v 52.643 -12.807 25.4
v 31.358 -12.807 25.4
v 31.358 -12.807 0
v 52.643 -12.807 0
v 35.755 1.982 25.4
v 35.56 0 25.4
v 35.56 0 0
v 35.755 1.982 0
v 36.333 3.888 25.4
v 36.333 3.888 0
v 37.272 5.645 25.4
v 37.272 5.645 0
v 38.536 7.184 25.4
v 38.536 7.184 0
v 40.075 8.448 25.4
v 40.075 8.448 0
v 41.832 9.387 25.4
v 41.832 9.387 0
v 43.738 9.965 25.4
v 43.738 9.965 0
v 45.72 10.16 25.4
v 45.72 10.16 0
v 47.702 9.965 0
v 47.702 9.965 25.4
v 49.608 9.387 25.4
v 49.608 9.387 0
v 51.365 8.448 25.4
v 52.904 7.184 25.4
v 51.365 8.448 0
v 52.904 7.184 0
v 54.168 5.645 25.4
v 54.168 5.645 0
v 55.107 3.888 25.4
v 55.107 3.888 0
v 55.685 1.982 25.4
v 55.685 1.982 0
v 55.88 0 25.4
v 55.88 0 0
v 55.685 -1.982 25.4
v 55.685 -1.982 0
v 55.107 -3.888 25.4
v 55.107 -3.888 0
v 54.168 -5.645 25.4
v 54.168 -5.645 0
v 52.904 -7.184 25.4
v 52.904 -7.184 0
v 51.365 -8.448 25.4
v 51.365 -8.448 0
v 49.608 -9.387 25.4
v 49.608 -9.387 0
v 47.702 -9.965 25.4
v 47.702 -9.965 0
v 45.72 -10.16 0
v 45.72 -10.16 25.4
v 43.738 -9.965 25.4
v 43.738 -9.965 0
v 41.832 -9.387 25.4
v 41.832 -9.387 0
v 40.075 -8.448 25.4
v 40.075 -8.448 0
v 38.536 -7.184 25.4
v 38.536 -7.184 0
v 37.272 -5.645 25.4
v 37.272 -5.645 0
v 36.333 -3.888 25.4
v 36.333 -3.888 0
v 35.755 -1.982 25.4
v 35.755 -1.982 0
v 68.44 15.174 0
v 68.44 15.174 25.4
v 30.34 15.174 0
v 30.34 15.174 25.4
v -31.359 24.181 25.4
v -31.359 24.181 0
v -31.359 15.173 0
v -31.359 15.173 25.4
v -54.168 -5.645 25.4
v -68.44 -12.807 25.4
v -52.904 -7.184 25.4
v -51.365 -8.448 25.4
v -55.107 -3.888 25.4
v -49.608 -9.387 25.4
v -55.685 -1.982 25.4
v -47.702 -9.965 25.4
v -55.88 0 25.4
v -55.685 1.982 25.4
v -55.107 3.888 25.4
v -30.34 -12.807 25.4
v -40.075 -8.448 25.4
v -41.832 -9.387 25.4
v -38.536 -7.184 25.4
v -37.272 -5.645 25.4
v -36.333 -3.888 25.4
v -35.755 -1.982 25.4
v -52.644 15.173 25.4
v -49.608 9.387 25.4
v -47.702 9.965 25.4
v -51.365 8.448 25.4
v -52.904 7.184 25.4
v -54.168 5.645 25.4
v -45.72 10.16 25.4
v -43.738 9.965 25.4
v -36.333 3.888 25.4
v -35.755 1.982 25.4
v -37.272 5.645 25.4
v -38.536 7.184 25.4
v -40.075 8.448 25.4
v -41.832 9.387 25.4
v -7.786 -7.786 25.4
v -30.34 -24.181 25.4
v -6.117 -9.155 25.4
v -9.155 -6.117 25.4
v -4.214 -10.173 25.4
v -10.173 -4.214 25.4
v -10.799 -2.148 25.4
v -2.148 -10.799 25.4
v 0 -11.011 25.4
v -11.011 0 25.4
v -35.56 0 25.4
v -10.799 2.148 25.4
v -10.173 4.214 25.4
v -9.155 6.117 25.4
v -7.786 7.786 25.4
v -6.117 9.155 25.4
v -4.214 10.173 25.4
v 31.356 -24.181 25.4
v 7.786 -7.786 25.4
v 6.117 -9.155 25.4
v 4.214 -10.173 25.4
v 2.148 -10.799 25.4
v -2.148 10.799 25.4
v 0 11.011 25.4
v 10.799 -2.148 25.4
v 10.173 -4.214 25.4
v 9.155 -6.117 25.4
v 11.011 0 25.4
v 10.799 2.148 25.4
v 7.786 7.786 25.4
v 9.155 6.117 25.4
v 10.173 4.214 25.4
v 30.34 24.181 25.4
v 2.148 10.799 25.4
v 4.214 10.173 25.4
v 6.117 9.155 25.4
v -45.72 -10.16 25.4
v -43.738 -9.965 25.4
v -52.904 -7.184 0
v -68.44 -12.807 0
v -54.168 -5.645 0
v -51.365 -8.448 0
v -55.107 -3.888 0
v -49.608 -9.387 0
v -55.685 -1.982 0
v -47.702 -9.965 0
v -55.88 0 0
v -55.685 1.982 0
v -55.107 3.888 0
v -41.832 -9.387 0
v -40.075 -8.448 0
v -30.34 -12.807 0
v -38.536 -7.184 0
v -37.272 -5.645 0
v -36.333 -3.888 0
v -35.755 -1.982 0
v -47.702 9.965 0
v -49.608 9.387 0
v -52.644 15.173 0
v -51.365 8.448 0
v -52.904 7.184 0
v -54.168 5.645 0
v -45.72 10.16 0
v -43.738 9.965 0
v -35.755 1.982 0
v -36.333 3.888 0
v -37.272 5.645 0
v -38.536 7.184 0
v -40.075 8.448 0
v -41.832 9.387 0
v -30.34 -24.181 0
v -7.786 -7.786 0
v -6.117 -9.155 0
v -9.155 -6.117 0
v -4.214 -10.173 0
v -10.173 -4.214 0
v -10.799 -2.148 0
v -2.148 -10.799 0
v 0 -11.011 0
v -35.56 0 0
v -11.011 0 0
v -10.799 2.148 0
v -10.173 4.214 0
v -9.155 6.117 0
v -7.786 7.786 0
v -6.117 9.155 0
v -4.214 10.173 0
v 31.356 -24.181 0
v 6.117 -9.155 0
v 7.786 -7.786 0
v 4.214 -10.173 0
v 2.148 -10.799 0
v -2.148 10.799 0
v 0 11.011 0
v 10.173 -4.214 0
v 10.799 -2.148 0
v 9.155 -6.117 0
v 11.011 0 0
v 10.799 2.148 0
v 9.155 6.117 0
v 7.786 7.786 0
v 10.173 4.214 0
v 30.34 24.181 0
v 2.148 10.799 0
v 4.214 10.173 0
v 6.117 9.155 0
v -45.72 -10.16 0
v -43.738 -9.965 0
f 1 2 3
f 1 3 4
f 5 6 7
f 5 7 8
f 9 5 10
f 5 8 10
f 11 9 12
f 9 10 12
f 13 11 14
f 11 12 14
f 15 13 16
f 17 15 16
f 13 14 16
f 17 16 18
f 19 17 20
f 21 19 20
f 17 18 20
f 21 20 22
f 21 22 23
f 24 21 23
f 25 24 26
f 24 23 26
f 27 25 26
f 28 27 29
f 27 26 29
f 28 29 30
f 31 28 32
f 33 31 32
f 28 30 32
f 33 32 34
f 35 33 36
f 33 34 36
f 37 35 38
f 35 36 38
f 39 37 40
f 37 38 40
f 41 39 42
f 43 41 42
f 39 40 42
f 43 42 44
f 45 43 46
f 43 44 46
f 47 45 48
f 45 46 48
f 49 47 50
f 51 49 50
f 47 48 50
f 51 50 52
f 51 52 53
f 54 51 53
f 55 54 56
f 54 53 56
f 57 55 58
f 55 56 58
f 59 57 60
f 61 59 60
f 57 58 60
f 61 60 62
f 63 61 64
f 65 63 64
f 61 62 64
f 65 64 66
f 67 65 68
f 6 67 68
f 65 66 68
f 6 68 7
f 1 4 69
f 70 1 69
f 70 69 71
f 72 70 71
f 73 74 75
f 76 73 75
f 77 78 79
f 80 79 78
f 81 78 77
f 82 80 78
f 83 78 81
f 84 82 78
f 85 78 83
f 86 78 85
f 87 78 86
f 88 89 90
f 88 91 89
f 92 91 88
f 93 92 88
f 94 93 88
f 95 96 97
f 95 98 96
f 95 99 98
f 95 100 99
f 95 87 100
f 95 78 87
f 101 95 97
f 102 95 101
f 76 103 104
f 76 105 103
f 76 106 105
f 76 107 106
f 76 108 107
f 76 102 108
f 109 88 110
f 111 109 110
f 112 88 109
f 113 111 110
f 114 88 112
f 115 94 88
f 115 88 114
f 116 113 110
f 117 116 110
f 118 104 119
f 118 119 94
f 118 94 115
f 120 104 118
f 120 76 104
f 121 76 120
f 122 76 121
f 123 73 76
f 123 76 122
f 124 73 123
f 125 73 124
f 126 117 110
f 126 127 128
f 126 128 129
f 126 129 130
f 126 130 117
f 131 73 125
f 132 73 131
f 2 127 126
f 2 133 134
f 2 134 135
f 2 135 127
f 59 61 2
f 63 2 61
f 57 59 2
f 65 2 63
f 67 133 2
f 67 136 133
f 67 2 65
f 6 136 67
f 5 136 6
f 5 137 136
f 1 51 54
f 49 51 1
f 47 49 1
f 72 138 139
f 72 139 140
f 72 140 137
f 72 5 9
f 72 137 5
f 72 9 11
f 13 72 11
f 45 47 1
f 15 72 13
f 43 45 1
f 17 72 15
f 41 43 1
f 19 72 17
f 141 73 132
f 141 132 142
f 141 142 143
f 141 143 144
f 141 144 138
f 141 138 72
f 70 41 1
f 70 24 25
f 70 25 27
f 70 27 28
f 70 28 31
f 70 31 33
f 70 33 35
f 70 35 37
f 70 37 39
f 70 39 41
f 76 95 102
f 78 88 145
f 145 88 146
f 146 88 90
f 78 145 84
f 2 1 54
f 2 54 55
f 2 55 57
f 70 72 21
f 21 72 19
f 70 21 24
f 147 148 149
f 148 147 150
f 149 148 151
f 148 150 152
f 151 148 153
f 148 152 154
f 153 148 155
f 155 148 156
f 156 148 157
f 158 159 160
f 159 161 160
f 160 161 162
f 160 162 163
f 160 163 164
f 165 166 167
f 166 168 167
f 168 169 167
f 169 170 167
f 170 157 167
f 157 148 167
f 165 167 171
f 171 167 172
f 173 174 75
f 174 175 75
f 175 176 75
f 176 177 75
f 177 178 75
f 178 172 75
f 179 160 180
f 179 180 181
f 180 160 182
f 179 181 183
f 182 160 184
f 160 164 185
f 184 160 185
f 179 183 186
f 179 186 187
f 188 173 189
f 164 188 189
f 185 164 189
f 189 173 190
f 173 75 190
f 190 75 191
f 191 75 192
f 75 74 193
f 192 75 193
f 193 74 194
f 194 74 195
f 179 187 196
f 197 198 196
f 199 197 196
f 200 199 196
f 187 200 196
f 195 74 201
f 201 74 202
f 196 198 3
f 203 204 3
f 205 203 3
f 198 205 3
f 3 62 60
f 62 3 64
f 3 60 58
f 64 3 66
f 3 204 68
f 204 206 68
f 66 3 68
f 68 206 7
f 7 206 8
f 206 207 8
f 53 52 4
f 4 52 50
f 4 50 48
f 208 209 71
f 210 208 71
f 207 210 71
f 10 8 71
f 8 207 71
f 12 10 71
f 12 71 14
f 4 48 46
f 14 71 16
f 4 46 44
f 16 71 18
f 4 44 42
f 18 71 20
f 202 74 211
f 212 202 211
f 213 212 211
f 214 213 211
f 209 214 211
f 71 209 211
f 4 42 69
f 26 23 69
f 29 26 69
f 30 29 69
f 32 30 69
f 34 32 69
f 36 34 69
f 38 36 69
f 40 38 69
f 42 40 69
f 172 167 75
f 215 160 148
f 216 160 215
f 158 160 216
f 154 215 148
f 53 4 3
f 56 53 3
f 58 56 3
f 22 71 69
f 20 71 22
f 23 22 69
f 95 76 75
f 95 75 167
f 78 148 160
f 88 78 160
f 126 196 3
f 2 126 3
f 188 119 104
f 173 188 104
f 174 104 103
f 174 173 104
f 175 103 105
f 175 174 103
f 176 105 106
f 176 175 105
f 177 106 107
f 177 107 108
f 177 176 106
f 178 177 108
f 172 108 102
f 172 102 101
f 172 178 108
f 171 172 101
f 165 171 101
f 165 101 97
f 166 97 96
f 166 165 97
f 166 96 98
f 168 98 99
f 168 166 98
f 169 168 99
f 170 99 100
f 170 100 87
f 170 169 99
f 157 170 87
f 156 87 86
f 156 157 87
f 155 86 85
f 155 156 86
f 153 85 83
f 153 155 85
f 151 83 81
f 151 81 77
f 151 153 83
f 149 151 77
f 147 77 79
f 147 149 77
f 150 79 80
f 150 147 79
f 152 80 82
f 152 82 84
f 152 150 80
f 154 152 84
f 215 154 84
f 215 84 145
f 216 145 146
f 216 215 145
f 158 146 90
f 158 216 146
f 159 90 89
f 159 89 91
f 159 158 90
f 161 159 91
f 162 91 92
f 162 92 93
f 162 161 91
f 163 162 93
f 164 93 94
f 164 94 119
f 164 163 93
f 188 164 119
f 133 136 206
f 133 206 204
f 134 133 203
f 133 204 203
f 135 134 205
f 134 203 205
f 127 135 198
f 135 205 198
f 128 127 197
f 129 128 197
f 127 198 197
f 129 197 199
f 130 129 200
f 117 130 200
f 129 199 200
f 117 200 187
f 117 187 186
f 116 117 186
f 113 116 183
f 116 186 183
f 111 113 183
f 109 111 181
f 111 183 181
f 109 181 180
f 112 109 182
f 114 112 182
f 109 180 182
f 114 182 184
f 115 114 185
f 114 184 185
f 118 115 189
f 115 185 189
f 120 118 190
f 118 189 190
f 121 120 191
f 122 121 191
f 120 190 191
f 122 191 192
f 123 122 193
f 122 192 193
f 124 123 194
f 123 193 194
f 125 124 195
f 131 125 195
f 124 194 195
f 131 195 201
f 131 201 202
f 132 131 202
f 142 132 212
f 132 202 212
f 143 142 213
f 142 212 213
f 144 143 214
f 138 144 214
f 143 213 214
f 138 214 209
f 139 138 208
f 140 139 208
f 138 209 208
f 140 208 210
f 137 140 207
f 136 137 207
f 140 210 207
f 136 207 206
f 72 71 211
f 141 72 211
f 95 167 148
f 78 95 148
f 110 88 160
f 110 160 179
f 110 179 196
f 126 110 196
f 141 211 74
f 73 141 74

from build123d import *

# Parameters (mm, degrees)
F0_R     = 10.16
F1_DEPTH = 25.4


with BuildPart() as f1:
    # F0 (on Top) → F1 (new body)
    with BuildSketch(Plane.XY):
        with Locations((-45.72, 0)):
            Circle(F0_R)
        with BuildLine():
            ThreePointArc((55.88, 0), (45.72, 10.16), (35.56, 0))
            ThreePointArc((35.56, 0), (45.72, -10.16), (55.88, 0))
        make_face()
        Polygon((-31.35884, 15.172625), (-52.64404, 15.172625), (-68.4403, -12.807356), (-30.3403, -12.807356), (-30.3403, -24.1808), (31.3563, -24.1808), (31.358133, -12.807356), (52.643333, -12.807356), (68.4403, 15.173876), (30.3403, 15.173876), (30.3403, 24.1808), (-31.35884, 24.1808), align=None)
        with Locations((-45.72, 0)):
            Circle(F0_R, mode=Mode.SUBTRACT)
        with BuildLine():
            ThreePointArc((-11.0109, 0), (0, 11.0109), (11.0109, 0))
            ThreePointArc((11.0109, 0), (0, -11.0109), (-11.0109, 0))
        make_face(mode=Mode.SUBTRACT)
        with BuildLine():
            ThreePointArc((55.88, 0), (45.72, -10.16), (35.56, 0))
            ThreePointArc((35.56, 0), (45.72, 10.16), (55.88, 0))
        make_face(mode=Mode.SUBTRACT)
    extrude(amount=F1_DEPTH)


solid = f1.part
